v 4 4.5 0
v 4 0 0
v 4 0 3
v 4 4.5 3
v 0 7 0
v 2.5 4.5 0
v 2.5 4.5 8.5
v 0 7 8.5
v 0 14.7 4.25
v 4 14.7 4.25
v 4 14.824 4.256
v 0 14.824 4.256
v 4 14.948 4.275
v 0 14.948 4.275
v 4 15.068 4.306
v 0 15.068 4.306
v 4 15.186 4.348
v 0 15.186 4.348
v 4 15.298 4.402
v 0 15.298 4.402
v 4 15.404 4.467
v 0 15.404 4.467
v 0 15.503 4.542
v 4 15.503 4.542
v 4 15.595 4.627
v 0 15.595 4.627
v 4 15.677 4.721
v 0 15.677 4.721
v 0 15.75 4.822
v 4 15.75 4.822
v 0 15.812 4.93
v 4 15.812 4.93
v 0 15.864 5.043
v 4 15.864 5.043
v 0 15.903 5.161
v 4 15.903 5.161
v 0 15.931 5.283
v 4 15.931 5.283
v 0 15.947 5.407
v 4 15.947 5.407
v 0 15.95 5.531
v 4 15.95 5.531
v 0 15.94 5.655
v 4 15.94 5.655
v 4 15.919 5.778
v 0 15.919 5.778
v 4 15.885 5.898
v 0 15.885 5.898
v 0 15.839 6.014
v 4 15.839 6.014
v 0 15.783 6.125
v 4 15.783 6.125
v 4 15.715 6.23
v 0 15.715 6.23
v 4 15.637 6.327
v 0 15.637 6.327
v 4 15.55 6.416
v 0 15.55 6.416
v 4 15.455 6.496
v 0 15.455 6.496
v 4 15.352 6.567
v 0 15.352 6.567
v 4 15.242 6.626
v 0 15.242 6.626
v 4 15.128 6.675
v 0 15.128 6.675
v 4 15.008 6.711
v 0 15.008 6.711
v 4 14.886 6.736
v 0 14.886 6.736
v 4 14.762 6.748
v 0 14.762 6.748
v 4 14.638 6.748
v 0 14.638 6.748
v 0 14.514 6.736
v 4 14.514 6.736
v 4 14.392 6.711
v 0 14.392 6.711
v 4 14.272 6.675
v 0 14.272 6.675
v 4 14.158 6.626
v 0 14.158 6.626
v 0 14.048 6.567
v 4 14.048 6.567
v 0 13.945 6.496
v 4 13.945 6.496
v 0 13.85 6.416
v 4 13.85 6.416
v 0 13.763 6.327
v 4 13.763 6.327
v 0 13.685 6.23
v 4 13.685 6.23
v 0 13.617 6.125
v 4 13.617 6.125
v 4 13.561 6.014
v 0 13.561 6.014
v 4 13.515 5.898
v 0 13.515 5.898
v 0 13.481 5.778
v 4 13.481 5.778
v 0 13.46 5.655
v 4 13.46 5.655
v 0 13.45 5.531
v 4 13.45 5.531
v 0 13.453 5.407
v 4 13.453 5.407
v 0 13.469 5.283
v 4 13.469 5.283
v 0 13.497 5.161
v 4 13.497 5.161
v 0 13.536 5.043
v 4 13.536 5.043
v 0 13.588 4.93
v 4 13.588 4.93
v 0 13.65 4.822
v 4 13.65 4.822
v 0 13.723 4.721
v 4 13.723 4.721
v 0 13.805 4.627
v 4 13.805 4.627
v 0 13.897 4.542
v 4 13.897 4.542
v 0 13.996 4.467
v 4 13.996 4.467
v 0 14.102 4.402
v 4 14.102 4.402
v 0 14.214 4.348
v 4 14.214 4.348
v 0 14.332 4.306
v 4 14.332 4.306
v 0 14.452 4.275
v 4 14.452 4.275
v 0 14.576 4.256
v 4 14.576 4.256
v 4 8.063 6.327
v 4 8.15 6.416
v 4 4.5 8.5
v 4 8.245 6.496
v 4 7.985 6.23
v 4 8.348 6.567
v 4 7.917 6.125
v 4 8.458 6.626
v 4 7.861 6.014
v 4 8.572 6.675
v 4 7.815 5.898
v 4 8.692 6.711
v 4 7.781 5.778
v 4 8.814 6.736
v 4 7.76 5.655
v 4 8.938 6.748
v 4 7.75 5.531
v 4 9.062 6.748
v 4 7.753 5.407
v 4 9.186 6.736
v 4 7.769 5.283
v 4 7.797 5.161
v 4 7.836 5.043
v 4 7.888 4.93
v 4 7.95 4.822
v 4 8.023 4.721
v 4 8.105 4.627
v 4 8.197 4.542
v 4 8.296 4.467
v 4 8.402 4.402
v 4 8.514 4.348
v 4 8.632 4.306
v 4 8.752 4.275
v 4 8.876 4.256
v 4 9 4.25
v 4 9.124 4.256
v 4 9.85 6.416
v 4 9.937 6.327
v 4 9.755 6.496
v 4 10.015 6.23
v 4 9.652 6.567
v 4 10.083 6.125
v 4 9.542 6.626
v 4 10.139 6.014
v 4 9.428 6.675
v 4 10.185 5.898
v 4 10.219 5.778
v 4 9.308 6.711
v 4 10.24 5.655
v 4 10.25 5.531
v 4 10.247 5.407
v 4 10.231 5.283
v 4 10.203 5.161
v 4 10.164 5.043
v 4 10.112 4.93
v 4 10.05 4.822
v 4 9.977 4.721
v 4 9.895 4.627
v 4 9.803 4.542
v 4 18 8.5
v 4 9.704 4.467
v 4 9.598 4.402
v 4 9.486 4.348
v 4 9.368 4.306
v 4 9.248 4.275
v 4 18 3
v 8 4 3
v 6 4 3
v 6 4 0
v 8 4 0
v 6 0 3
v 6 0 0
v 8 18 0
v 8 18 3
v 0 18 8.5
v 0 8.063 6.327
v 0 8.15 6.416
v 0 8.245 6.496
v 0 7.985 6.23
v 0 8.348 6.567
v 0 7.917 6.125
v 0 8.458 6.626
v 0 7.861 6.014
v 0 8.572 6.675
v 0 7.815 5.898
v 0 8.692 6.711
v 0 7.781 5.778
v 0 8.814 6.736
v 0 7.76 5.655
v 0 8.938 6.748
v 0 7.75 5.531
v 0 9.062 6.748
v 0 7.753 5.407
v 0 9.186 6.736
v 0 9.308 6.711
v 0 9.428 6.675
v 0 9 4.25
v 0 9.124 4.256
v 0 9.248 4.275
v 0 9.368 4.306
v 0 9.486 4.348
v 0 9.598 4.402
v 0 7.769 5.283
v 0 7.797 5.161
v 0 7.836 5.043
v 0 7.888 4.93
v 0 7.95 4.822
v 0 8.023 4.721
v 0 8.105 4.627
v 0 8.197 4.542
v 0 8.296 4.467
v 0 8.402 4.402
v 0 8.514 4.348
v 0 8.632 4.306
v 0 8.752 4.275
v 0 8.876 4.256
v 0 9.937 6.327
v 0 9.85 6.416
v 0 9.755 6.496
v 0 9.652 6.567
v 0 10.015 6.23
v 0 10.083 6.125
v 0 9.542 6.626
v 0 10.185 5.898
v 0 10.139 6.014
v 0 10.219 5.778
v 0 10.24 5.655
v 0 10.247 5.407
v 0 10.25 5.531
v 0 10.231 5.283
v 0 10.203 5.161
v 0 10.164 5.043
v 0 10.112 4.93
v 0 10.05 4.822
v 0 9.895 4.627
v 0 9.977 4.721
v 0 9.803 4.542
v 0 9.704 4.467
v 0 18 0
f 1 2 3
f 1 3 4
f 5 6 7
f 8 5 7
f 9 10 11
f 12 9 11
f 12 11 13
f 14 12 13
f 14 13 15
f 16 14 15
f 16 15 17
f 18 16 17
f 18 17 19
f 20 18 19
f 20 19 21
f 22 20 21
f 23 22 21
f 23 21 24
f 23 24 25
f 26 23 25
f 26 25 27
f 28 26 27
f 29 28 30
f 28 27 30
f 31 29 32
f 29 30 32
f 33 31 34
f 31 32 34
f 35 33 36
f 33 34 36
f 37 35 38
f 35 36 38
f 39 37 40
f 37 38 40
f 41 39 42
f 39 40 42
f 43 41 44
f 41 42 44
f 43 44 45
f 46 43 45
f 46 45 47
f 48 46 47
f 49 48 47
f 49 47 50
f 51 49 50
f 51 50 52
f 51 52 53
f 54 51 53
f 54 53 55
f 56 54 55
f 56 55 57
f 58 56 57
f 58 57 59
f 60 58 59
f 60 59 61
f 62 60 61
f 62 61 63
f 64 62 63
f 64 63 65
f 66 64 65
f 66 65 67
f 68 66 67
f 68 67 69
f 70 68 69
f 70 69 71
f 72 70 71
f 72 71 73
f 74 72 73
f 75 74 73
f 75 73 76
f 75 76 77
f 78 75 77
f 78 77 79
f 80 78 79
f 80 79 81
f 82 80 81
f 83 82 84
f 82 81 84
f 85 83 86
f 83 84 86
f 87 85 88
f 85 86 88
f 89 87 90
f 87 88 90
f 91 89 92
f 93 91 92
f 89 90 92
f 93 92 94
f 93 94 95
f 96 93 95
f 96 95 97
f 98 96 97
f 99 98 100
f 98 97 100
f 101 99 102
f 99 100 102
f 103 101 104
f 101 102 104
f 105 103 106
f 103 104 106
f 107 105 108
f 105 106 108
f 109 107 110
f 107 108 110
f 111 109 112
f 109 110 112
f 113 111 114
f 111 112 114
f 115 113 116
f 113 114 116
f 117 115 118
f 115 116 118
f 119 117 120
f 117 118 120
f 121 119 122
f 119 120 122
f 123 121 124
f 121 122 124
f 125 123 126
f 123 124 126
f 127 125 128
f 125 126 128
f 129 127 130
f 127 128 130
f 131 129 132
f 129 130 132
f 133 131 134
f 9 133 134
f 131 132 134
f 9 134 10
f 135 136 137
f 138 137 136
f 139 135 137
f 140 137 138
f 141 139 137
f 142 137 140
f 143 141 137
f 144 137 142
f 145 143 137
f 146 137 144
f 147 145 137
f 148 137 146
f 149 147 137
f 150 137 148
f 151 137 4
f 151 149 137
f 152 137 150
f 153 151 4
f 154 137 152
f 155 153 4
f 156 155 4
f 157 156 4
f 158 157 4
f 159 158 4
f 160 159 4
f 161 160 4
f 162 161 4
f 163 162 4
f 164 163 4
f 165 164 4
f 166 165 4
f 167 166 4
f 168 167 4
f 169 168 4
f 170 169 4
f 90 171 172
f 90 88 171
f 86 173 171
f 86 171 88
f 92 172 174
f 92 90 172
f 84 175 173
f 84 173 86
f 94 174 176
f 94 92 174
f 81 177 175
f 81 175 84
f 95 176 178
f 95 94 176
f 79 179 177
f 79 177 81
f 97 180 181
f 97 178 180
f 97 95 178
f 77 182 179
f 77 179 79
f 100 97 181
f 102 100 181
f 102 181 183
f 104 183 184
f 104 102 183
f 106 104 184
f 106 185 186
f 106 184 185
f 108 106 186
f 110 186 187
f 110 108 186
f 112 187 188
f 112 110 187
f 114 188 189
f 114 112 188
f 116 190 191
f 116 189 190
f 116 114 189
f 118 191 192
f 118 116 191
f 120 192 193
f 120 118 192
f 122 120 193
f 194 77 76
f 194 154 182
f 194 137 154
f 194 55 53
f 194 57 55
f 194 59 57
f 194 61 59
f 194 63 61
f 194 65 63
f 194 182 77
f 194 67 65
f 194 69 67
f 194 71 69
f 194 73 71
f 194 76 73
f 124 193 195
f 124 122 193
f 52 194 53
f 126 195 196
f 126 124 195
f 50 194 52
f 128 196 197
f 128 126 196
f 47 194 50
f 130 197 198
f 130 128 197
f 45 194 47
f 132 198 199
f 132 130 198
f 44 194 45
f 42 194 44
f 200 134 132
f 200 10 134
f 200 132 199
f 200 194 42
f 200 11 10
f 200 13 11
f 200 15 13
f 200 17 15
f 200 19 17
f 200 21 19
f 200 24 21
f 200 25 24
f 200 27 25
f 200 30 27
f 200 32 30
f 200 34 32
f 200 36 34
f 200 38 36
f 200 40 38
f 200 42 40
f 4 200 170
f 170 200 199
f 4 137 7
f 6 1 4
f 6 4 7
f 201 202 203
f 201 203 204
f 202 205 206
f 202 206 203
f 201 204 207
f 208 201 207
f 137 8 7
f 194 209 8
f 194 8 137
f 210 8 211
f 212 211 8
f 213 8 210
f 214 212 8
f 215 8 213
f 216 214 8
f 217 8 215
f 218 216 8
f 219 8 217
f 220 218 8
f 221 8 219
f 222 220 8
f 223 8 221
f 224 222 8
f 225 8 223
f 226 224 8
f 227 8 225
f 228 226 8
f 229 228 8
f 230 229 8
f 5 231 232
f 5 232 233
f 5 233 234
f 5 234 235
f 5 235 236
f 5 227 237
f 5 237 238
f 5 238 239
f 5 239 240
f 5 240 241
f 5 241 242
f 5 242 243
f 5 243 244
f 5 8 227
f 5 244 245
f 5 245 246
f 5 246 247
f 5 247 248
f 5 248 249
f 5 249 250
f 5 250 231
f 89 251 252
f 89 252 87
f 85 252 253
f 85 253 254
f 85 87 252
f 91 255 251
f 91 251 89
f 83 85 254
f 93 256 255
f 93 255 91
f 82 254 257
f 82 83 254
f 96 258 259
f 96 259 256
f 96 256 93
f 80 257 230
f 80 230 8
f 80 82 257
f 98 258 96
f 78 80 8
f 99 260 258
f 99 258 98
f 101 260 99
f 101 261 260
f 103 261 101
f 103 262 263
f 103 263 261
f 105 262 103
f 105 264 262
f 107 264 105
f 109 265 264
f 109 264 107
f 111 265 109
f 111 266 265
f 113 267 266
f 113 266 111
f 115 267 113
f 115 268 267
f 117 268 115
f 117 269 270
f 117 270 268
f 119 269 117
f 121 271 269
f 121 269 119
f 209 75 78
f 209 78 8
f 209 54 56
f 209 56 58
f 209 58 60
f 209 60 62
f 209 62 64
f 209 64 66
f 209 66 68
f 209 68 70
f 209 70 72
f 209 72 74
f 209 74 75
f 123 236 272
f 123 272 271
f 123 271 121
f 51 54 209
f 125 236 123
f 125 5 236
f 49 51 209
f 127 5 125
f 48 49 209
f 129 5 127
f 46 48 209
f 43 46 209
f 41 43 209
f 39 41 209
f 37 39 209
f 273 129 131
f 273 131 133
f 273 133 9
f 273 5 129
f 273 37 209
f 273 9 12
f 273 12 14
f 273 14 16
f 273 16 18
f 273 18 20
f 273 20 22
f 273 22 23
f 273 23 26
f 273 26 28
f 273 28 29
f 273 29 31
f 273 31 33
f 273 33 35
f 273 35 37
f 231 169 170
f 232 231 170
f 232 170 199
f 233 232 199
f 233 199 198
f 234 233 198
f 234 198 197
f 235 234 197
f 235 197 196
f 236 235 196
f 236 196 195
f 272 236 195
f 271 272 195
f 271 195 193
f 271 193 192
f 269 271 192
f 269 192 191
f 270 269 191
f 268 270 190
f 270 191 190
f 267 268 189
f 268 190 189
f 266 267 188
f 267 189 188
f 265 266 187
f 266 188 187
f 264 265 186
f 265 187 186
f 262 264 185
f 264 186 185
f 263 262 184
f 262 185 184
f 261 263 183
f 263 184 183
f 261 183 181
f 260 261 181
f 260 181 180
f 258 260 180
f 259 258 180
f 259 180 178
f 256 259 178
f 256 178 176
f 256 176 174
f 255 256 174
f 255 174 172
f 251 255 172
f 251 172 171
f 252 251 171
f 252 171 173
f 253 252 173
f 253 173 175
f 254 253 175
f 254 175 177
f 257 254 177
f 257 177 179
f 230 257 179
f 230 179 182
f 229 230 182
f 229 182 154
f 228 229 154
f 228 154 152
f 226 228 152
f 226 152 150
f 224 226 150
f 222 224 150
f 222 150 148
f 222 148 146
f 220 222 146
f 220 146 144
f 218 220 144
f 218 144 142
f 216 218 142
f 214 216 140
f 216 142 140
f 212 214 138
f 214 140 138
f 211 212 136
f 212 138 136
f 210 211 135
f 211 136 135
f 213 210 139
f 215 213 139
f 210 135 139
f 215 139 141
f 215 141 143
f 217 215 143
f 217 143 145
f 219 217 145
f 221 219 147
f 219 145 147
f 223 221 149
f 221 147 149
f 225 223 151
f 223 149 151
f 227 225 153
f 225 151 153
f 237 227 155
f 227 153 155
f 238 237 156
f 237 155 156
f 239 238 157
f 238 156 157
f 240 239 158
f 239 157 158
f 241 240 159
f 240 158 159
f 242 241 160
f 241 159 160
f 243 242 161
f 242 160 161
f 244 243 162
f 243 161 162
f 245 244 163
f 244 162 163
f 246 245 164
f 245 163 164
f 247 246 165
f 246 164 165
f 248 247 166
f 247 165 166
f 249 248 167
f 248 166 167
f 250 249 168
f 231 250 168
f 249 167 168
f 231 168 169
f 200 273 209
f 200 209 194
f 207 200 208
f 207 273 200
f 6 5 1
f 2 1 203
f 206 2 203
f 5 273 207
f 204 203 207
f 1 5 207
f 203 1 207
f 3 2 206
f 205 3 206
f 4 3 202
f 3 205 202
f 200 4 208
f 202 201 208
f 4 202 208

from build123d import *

# Parameters (mm, degrees)
SKETCH_1_W          = 8
SKETCH_1_H          = 18
EXTRUDE_1_DEPTH     = 8.5
SKETCH_2_W          = 4
SKETCH_2_H          = 5.5
CUT_EXTRUDE_1_DEPTH = 22.453437953
HOLE_WIZARD_M3_1_D  = 2.5
SKETCH_5_W          = 5.5
SKETCH_5_H          = 4
CUT_EXTRUDE_2_DEPTH = 8.5
SKETCH_6_W          = 2
SKETCH_6_H          = 4
CUT_EXTRUDE_3_DEPTH = 21.451161336
SKETCH_7_W          = 4
SKETCH_7_H          = 4.5
CUT_EXTRUDE_4_DEPTH = 22.453437953
CHAMFER_1_SIZE      = 2.5


with BuildPart() as part:
    # 草图1 → 凸台-拉伸1 (new body)
    with BuildSketch(Plane.XY):
        with Locations((4, 9)):
            Rectangle(SKETCH_1_W, SKETCH_1_H)
    extrude(amount=EXTRUDE_1_DEPTH)

    # 草图2 → 切除-拉伸1 (cut, through all)
    with BuildSketch(Plane(origin=(0, 18, 0), x_dir=(1, 0, 0), z_dir=(0, 1, 0))):
        with Locations((6, -5.75)):
            Rectangle(SKETCH_2_W, SKETCH_2_H)
    extrude(amount=-CUT_EXTRUDE_1_DEPTH, mode=Mode.SUBTRACT)

    # M3 螺纹孔1 (through all)
    with Locations(Plane.ZY):
        with Locations((5.5, 14.7), (5.5, 9)):
            Hole(HOLE_WIZARD_M3_1_D / 2)

    # 草图5 → 切除-拉伸2 (cut)
    with BuildSketch(Plane(origin=(4, 0, 0), x_dir=(0, 0, -1), z_dir=(1, 0, 0))):
        with Locations((-5.75, 2)):
            Rectangle(SKETCH_5_W, SKETCH_5_H)
    extrude(amount=-CUT_EXTRUDE_2_DEPTH, mode=Mode.SUBTRACT)

    # 草图6 → 切除-拉伸3 (cut, through all)
    with BuildSketch(Plane.XY.offset(3)):
        with Locations((7, 2)):
            Rectangle(SKETCH_6_W, SKETCH_6_H)
    extrude(amount=-CUT_EXTRUDE_3_DEPTH, mode=Mode.SUBTRACT)

    # 草图7 → 切除-拉伸4 (cut, through all)
    with BuildSketch(Plane(origin=(0, 0, 0), x_dir=(-1, 0, 0), z_dir=(0, 0, -1))):
        with Locations((-2, 2.25)):
            Rectangle(SKETCH_7_W, SKETCH_7_H)
    extrude(amount=-CUT_EXTRUDE_4_DEPTH, mode=Mode.SUBTRACT)

    # 倒角1
    chamfer_1_edges = [part.edges().sort_by_distance(p)[0] for p in [
        (0, 4.5, 4.25),
    ]]
    chamfer(chamfer_1_edges, length=CHAMFER_1_SIZE)


solid = part.part
